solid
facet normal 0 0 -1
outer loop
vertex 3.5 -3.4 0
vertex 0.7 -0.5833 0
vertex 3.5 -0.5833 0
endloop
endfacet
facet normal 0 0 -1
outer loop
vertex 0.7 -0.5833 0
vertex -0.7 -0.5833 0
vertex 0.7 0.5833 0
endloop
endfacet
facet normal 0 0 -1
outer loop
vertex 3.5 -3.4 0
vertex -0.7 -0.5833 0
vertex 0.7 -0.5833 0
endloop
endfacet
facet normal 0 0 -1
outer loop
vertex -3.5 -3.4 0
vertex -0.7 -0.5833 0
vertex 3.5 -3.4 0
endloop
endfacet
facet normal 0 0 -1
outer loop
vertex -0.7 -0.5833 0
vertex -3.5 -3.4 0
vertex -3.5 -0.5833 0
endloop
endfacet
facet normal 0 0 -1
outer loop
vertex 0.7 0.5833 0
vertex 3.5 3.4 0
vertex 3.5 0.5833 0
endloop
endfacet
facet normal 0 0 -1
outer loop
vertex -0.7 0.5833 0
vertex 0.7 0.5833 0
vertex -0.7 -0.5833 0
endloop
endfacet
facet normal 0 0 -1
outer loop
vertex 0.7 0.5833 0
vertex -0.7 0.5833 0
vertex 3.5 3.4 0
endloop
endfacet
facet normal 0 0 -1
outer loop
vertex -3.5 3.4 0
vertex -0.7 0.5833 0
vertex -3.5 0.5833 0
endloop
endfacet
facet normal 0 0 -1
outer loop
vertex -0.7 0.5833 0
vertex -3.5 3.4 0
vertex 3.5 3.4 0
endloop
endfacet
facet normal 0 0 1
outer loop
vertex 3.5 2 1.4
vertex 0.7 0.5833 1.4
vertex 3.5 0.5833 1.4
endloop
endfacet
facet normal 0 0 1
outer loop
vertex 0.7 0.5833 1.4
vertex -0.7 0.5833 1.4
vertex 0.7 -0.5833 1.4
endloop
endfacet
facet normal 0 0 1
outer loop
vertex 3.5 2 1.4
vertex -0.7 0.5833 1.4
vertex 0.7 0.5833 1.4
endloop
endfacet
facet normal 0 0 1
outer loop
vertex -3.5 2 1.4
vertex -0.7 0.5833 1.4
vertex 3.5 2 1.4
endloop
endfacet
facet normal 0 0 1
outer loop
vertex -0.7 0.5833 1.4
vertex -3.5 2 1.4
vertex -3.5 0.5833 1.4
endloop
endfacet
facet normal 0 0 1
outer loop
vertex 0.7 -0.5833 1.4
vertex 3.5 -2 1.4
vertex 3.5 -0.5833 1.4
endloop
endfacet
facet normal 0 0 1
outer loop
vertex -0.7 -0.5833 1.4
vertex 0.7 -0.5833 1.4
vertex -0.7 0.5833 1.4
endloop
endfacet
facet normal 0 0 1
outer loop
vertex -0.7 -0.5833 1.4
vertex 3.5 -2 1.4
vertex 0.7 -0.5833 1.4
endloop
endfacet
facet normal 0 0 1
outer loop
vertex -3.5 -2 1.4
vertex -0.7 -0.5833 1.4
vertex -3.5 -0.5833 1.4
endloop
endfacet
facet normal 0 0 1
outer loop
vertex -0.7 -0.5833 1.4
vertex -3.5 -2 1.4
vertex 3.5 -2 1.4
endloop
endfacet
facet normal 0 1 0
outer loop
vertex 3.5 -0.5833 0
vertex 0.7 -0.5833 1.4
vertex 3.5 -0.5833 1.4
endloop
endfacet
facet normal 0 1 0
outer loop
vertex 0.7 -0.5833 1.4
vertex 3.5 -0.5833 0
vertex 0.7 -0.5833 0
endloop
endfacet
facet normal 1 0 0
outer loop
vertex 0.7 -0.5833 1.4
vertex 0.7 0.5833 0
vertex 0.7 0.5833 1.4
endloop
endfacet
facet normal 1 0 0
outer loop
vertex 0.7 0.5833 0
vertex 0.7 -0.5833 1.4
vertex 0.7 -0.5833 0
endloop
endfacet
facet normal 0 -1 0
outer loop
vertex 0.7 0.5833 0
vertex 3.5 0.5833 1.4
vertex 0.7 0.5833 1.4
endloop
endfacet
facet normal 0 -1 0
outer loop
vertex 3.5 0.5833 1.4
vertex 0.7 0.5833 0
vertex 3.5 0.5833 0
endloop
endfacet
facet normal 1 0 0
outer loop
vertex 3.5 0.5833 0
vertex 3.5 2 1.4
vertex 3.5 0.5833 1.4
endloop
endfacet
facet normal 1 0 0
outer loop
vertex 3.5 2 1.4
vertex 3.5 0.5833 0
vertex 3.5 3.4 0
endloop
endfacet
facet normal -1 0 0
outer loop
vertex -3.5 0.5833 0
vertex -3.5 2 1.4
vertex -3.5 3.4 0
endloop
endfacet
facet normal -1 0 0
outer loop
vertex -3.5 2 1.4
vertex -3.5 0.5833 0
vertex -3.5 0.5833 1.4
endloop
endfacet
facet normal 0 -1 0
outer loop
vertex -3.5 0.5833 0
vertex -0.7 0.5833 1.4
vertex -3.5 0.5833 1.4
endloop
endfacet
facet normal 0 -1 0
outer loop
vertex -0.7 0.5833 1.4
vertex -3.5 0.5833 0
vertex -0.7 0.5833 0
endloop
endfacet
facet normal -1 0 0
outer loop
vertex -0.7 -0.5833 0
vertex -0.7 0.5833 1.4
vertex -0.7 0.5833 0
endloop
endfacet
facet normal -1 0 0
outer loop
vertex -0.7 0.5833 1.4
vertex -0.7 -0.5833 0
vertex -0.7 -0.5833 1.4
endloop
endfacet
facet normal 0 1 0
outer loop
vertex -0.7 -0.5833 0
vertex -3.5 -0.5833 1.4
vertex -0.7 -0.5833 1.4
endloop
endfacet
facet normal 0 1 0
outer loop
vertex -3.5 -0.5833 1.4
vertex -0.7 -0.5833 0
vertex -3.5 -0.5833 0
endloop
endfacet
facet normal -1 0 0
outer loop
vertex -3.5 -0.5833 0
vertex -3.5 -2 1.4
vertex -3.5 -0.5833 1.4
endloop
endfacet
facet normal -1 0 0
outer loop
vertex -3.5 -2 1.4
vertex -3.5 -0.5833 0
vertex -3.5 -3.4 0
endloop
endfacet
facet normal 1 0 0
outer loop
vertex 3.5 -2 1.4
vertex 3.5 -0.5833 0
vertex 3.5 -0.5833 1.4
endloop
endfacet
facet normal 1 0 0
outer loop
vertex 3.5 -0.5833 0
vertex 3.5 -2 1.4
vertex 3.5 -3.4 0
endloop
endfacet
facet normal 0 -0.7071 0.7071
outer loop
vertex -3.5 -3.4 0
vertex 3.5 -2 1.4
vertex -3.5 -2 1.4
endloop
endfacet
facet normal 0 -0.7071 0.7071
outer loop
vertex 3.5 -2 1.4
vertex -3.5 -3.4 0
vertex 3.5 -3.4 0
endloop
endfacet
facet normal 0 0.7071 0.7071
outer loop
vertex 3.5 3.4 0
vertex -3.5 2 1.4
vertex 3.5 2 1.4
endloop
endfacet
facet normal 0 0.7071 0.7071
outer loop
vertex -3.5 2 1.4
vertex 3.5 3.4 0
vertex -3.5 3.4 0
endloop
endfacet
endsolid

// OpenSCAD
// file: geometry.scad
function base_profile(p_edge_length) = [
    [0, 0], [p_edge_length, 0], [0, p_edge_length]
];

function bottom_profile(p_edge_length, p_clearance) = [
    [0, 0], [p_edge_length + p_clearance, 0], [0, p_edge_length + p_clearance]
];

function clip_profile(p_edge_length, p_clearance) =
    let(
        c1 = p_edge_length,
        c2 = p_edge_length * 0.2,
        r1 = p_edge_length - p_clearance / 2,
        r2 = p_edge_length / 6)
    [
        [-c1, r1], [c1, r1], [c1, r2], [c2, r2], [c2, -r2], [c1, -r2],
        [c1, -r1], [-c1, -r1], [-c1, -r2], [-c2, -r2], [-c2, r2], [-c1, r2]
    ];

module base_profile_cutout(p_edge_length, p_clearance, orient=0) {
    rotate([0, 90, 180 * orient])
      translate([-p_edge_length, -p_edge_length, 0])
        linear_extrude(height=p_edge_length * 2 + 1, center = true)
          polygon(bottom_profile(p_edge_length, p_clearance));
}

module clip(p_edge_length, p_clearance) {
  difference() {
    translate([0, 0, 0])
      linear_extrude(height=p_edge_length * 0.4)
        polygon(clip_profile(p_edge_length, p_clearance));
    base_profile_cutout(p_edge_length, p_clearance, 0);
    base_profile_cutout(p_edge_length, p_clearance, 1);
  }
}

module clip_cutout(p_edge_length, p_clearance) {
    union() {
        scale([1 + p_clearance / 2 / p_edge_length, 1, 1])
            clip(p_edge_length, p_clearance);
        base_profile_cutout(p_edge_length, p_clearance, 0);
        base_profile_cutout(p_edge_length, p_clearance, 1);
    }
}
// file: parameters.scad
edge_ln = 3.5; // [0:0.5:14]
clearance = 0.1; // [0:0.05:1]
edge_len = 16; // [0:0.5:42]
// main file
include <parameters.scad>
include <geometry.scad>

clip(edge_ln, clearance);
